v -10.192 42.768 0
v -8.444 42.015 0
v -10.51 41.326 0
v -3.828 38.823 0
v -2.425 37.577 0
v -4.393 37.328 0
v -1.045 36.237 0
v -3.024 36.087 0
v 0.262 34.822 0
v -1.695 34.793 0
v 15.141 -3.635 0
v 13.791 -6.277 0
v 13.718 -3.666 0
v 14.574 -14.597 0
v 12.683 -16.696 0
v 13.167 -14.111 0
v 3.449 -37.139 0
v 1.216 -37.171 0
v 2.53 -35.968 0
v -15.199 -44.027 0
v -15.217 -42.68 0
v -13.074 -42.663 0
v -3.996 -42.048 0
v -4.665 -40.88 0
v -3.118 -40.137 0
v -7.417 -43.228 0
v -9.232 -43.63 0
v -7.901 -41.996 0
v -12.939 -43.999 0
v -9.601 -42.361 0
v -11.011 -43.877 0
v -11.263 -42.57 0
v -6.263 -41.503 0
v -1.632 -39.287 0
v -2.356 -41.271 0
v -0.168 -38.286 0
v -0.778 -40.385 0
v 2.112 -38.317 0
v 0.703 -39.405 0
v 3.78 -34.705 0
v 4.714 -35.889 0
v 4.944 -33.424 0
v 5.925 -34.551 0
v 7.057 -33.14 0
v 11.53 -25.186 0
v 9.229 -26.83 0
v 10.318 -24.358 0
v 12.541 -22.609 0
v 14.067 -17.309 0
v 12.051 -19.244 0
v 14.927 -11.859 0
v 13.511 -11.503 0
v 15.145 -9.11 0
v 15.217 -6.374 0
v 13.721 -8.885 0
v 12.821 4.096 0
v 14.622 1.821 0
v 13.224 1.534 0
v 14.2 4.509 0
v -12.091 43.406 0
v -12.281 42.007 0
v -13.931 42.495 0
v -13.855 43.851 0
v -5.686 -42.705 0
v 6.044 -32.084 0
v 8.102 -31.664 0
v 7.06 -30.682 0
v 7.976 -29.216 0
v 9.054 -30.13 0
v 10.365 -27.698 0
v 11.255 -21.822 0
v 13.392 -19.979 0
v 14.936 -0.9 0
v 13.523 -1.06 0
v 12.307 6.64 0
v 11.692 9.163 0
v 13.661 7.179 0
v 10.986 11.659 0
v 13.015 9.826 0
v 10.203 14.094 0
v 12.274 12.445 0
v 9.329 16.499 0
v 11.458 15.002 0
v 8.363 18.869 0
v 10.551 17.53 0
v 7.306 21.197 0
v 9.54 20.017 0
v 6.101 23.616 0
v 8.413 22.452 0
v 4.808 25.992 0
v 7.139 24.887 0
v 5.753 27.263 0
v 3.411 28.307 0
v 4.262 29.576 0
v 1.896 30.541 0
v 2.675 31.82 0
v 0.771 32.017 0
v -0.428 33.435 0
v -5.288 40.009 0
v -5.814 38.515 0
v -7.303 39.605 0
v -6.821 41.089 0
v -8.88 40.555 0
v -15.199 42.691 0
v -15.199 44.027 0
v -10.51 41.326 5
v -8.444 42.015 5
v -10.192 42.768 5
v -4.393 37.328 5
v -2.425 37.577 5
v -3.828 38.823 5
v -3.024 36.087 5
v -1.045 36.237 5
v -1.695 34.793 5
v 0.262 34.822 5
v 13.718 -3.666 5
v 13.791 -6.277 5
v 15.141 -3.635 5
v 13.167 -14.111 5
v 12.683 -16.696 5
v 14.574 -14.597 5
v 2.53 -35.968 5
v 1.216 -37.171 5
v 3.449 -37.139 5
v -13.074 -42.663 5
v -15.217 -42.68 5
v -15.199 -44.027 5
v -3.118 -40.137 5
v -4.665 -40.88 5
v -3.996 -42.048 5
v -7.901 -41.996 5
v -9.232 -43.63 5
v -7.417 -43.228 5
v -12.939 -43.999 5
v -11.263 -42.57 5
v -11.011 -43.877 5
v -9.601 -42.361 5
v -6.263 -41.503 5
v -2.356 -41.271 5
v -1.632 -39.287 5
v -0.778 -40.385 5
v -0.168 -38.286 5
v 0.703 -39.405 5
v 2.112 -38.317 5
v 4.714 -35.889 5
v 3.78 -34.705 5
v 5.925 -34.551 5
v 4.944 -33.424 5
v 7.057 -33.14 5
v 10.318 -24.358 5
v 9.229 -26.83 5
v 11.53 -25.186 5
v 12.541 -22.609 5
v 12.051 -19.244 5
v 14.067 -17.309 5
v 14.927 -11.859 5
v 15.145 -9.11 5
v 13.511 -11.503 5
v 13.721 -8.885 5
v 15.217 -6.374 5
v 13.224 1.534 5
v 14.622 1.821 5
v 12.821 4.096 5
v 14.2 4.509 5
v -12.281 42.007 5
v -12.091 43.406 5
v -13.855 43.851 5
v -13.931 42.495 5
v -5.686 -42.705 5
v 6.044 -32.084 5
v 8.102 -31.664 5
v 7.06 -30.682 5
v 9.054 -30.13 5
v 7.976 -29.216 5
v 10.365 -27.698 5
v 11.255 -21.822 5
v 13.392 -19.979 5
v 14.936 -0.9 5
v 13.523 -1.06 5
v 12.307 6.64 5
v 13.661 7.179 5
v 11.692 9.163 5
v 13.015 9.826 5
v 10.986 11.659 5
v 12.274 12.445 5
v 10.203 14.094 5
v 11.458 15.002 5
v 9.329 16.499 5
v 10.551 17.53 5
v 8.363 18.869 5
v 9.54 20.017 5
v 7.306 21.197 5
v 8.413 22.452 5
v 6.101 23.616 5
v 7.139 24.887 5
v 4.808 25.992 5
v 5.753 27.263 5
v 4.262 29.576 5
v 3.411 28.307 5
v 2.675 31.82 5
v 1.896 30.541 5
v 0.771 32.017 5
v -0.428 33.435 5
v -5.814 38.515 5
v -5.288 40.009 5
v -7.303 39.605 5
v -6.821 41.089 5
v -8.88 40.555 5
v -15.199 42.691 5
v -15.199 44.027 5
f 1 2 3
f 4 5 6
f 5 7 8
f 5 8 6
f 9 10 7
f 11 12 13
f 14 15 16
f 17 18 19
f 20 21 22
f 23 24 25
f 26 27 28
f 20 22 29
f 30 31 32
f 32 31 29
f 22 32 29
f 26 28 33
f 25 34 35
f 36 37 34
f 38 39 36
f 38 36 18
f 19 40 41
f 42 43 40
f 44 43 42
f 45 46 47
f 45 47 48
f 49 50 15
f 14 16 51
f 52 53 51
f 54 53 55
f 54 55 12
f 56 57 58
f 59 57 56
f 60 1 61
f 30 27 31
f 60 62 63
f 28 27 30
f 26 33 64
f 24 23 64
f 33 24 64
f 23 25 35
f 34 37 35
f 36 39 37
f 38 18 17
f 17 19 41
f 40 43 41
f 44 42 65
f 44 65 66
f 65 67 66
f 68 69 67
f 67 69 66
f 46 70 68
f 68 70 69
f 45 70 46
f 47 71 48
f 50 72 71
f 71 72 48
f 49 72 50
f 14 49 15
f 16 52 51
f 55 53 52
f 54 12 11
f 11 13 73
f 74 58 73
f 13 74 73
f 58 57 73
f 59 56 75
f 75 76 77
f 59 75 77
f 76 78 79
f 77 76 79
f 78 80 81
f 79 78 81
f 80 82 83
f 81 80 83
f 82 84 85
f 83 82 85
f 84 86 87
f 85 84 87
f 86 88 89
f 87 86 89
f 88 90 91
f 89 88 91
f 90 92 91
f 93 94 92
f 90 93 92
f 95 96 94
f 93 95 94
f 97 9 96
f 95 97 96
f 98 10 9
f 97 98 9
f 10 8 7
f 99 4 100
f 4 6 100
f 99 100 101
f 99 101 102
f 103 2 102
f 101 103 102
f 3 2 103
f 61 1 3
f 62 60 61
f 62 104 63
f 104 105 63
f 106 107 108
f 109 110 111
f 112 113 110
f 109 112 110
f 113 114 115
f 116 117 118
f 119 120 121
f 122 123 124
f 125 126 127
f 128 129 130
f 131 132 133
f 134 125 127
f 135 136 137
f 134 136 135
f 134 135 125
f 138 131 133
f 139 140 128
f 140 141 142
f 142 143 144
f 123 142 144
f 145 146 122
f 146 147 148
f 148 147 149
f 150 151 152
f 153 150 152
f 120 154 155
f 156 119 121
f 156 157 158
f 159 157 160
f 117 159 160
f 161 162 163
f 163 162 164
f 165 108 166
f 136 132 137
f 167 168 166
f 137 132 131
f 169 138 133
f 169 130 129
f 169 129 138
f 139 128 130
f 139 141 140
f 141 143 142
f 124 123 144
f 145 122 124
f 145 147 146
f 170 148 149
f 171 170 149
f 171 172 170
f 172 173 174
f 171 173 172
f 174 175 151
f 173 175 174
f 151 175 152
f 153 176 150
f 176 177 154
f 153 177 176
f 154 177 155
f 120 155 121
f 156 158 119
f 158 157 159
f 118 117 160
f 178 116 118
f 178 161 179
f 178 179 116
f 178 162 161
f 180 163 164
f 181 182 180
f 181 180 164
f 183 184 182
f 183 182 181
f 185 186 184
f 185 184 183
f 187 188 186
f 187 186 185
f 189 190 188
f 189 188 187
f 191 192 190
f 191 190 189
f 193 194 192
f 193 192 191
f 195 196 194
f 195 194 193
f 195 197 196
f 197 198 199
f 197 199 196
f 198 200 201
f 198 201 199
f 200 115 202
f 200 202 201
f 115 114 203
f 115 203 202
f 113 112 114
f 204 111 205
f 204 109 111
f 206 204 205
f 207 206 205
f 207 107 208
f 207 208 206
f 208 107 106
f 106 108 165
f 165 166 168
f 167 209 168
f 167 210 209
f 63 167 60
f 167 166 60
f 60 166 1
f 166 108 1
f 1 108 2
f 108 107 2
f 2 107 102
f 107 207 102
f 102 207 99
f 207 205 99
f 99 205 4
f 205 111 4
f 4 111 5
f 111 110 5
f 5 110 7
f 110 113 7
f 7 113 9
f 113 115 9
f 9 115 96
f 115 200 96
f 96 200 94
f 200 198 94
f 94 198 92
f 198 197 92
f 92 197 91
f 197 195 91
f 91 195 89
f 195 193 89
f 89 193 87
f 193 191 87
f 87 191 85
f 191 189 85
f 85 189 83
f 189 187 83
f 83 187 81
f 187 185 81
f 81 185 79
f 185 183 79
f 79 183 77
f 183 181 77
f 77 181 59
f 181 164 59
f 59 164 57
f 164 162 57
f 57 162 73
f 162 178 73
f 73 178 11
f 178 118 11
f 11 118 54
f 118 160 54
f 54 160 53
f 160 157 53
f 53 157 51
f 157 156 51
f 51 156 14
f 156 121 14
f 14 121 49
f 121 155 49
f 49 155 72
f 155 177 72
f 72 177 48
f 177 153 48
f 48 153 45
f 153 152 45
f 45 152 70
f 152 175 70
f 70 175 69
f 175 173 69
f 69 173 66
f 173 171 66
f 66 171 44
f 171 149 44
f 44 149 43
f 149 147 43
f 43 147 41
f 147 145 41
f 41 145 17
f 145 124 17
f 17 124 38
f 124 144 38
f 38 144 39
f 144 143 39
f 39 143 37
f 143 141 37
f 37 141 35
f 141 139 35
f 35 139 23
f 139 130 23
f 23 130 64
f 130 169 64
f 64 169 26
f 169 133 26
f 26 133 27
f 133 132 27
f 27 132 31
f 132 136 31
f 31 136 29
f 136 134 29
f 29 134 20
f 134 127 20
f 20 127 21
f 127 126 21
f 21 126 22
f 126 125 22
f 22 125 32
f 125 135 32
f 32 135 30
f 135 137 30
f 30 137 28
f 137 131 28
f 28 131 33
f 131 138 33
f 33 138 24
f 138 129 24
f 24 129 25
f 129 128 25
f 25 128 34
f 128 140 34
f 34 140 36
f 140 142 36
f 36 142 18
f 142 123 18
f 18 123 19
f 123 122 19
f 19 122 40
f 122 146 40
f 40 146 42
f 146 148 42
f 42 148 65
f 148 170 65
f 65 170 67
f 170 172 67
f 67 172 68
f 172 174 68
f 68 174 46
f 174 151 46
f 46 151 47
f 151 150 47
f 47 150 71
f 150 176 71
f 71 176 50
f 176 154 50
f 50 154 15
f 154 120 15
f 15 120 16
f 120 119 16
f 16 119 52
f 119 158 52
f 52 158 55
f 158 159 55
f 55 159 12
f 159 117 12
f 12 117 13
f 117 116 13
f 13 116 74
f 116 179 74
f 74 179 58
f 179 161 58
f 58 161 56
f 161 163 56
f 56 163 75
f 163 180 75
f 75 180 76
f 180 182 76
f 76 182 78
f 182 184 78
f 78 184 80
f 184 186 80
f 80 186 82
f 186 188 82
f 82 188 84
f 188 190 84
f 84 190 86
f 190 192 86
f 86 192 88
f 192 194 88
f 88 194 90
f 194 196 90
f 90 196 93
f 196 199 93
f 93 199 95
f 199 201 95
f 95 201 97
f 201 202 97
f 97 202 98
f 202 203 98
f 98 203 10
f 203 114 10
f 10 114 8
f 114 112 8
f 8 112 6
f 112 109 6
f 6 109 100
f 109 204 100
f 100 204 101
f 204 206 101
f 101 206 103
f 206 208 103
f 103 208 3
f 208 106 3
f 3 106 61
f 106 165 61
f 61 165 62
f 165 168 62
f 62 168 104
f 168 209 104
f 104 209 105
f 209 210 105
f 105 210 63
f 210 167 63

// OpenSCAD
// Module names are of the form poly_<inkscape-path-id>().  As a result,
// you can associate a polygon in this OpenSCAD program with the corresponding
// SVG element in the Inkscape document by looking for the XML element with
// the attribute id="inkscape-path-id".

// fudge value is used to ensure that subtracted solids are a tad taller
// in the z dimension than the polygon being subtracted from.  This helps
// keep the resulting .stl file manifold.
fudge = 0.1;

module poly_path4550(h)
{
  scale([25.4/90, -25.4/90, 1]) union()
  {
    linear_extrude(height=h)
      polygon([[-26.281951,153.169696],[-20.147889,151.315793],[-14.157449,148.990561],[-8.347869,146.236771],[-2.756381,143.097196],[2.491324,139.623951],[7.483624,135.768540],[12.220909,131.594781],[16.703569,127.166496],[20.995108,122.423500],[25.004142,117.424657],[28.707056,112.195484],[32.080234,106.761496],[36.727905,98.142093],[40.855186,89.241867],[44.437550,80.109106],[47.450469,70.792096],[49.844308,61.331262],[51.639064,51.721295],[52.892327,42.018948],[53.661689,32.280976],[53.918501,22.586192],[53.648920,12.879526],[52.923004,3.190335],[51.810809,-6.452024],[50.315650,-15.977538],[48.404979,-25.436930],[46.117329,-34.814890],[43.491234,-44.096104],[40.599930,-53.156277],[37.384083,-62.114532],[33.801754,-70.928153],[29.811004,-79.554424],[25.294670,-88.182104],[20.383879,-96.602945],[15.103167,-104.797946],[9.477069,-112.748106],[0.929312,-123.385952],[-3.701231,-128.399128],[-8.592911,-133.145126],[-13.564086,-137.562607],[-18.737151,-141.765697],[-24.170091,-145.590151],[-29.920891,-148.871726],[-36.113968,-151.541759],[-42.842622,-153.800606],[-49.094055,-155.377081],[-53.855472,-155.999996],[-53.855472,-151.265966],[-49.362692,-150.573803],[-43.515066,-148.842612],[-37.239791,-146.430976],[-31.464059,-143.697478],[-25.878428,-140.333075],[-20.600218,-136.470462],[-15.566871,-132.263873],[-10.715829,-127.867541],[-6.005833,-123.281728],[-1.515254,-118.470104],[2.733240,-113.444518],[6.716977,-108.216821],[12.086820,-100.298913],[17.035966,-92.098391],[21.618162,-83.679952],[25.887154,-75.108294],[29.634009,-66.858939],[33.054655,-58.461693],[36.151228,-49.938864],[38.925864,-41.312764],[41.428806,-32.466790],[43.609177,-23.528605],[45.430248,-14.512804],[46.855289,-5.433984],[47.915331,3.756203],[48.607206,12.991025],[48.864145,22.242502],[48.619379,31.482656],[47.872782,40.760168],[46.656104,50.001200],[44.941075,59.159249],[42.699424,68.187816],[39.880750,77.323788],[36.561070,86.308122],[32.700754,95.065718],[28.260174,103.521476],[25.016984,108.715757],[21.415192,113.683622],[17.519445,118.432444],[13.394387,122.969596],[8.963204,127.445417],[4.309542,131.706875],[-0.596200,135.658363],[-5.783621,139.204276],[-11.047103,142.216769],[-16.529800,144.848762],[-22.192444,147.058552],[-27.995766,148.804436],[-34.017709,150.096461],[-39.908853,150.837781],[-46.324137,151.168131],[-53.918501,151.227246],[-53.855471,155.999996],[-45.846126,155.901141],[-39.015044,155.469175],[-32.710796,154.595044],[-26.281951,153.169696]]);
  }
}

module inkscape(h)
{

poly_path4550(h);
}

inkscape(5);
